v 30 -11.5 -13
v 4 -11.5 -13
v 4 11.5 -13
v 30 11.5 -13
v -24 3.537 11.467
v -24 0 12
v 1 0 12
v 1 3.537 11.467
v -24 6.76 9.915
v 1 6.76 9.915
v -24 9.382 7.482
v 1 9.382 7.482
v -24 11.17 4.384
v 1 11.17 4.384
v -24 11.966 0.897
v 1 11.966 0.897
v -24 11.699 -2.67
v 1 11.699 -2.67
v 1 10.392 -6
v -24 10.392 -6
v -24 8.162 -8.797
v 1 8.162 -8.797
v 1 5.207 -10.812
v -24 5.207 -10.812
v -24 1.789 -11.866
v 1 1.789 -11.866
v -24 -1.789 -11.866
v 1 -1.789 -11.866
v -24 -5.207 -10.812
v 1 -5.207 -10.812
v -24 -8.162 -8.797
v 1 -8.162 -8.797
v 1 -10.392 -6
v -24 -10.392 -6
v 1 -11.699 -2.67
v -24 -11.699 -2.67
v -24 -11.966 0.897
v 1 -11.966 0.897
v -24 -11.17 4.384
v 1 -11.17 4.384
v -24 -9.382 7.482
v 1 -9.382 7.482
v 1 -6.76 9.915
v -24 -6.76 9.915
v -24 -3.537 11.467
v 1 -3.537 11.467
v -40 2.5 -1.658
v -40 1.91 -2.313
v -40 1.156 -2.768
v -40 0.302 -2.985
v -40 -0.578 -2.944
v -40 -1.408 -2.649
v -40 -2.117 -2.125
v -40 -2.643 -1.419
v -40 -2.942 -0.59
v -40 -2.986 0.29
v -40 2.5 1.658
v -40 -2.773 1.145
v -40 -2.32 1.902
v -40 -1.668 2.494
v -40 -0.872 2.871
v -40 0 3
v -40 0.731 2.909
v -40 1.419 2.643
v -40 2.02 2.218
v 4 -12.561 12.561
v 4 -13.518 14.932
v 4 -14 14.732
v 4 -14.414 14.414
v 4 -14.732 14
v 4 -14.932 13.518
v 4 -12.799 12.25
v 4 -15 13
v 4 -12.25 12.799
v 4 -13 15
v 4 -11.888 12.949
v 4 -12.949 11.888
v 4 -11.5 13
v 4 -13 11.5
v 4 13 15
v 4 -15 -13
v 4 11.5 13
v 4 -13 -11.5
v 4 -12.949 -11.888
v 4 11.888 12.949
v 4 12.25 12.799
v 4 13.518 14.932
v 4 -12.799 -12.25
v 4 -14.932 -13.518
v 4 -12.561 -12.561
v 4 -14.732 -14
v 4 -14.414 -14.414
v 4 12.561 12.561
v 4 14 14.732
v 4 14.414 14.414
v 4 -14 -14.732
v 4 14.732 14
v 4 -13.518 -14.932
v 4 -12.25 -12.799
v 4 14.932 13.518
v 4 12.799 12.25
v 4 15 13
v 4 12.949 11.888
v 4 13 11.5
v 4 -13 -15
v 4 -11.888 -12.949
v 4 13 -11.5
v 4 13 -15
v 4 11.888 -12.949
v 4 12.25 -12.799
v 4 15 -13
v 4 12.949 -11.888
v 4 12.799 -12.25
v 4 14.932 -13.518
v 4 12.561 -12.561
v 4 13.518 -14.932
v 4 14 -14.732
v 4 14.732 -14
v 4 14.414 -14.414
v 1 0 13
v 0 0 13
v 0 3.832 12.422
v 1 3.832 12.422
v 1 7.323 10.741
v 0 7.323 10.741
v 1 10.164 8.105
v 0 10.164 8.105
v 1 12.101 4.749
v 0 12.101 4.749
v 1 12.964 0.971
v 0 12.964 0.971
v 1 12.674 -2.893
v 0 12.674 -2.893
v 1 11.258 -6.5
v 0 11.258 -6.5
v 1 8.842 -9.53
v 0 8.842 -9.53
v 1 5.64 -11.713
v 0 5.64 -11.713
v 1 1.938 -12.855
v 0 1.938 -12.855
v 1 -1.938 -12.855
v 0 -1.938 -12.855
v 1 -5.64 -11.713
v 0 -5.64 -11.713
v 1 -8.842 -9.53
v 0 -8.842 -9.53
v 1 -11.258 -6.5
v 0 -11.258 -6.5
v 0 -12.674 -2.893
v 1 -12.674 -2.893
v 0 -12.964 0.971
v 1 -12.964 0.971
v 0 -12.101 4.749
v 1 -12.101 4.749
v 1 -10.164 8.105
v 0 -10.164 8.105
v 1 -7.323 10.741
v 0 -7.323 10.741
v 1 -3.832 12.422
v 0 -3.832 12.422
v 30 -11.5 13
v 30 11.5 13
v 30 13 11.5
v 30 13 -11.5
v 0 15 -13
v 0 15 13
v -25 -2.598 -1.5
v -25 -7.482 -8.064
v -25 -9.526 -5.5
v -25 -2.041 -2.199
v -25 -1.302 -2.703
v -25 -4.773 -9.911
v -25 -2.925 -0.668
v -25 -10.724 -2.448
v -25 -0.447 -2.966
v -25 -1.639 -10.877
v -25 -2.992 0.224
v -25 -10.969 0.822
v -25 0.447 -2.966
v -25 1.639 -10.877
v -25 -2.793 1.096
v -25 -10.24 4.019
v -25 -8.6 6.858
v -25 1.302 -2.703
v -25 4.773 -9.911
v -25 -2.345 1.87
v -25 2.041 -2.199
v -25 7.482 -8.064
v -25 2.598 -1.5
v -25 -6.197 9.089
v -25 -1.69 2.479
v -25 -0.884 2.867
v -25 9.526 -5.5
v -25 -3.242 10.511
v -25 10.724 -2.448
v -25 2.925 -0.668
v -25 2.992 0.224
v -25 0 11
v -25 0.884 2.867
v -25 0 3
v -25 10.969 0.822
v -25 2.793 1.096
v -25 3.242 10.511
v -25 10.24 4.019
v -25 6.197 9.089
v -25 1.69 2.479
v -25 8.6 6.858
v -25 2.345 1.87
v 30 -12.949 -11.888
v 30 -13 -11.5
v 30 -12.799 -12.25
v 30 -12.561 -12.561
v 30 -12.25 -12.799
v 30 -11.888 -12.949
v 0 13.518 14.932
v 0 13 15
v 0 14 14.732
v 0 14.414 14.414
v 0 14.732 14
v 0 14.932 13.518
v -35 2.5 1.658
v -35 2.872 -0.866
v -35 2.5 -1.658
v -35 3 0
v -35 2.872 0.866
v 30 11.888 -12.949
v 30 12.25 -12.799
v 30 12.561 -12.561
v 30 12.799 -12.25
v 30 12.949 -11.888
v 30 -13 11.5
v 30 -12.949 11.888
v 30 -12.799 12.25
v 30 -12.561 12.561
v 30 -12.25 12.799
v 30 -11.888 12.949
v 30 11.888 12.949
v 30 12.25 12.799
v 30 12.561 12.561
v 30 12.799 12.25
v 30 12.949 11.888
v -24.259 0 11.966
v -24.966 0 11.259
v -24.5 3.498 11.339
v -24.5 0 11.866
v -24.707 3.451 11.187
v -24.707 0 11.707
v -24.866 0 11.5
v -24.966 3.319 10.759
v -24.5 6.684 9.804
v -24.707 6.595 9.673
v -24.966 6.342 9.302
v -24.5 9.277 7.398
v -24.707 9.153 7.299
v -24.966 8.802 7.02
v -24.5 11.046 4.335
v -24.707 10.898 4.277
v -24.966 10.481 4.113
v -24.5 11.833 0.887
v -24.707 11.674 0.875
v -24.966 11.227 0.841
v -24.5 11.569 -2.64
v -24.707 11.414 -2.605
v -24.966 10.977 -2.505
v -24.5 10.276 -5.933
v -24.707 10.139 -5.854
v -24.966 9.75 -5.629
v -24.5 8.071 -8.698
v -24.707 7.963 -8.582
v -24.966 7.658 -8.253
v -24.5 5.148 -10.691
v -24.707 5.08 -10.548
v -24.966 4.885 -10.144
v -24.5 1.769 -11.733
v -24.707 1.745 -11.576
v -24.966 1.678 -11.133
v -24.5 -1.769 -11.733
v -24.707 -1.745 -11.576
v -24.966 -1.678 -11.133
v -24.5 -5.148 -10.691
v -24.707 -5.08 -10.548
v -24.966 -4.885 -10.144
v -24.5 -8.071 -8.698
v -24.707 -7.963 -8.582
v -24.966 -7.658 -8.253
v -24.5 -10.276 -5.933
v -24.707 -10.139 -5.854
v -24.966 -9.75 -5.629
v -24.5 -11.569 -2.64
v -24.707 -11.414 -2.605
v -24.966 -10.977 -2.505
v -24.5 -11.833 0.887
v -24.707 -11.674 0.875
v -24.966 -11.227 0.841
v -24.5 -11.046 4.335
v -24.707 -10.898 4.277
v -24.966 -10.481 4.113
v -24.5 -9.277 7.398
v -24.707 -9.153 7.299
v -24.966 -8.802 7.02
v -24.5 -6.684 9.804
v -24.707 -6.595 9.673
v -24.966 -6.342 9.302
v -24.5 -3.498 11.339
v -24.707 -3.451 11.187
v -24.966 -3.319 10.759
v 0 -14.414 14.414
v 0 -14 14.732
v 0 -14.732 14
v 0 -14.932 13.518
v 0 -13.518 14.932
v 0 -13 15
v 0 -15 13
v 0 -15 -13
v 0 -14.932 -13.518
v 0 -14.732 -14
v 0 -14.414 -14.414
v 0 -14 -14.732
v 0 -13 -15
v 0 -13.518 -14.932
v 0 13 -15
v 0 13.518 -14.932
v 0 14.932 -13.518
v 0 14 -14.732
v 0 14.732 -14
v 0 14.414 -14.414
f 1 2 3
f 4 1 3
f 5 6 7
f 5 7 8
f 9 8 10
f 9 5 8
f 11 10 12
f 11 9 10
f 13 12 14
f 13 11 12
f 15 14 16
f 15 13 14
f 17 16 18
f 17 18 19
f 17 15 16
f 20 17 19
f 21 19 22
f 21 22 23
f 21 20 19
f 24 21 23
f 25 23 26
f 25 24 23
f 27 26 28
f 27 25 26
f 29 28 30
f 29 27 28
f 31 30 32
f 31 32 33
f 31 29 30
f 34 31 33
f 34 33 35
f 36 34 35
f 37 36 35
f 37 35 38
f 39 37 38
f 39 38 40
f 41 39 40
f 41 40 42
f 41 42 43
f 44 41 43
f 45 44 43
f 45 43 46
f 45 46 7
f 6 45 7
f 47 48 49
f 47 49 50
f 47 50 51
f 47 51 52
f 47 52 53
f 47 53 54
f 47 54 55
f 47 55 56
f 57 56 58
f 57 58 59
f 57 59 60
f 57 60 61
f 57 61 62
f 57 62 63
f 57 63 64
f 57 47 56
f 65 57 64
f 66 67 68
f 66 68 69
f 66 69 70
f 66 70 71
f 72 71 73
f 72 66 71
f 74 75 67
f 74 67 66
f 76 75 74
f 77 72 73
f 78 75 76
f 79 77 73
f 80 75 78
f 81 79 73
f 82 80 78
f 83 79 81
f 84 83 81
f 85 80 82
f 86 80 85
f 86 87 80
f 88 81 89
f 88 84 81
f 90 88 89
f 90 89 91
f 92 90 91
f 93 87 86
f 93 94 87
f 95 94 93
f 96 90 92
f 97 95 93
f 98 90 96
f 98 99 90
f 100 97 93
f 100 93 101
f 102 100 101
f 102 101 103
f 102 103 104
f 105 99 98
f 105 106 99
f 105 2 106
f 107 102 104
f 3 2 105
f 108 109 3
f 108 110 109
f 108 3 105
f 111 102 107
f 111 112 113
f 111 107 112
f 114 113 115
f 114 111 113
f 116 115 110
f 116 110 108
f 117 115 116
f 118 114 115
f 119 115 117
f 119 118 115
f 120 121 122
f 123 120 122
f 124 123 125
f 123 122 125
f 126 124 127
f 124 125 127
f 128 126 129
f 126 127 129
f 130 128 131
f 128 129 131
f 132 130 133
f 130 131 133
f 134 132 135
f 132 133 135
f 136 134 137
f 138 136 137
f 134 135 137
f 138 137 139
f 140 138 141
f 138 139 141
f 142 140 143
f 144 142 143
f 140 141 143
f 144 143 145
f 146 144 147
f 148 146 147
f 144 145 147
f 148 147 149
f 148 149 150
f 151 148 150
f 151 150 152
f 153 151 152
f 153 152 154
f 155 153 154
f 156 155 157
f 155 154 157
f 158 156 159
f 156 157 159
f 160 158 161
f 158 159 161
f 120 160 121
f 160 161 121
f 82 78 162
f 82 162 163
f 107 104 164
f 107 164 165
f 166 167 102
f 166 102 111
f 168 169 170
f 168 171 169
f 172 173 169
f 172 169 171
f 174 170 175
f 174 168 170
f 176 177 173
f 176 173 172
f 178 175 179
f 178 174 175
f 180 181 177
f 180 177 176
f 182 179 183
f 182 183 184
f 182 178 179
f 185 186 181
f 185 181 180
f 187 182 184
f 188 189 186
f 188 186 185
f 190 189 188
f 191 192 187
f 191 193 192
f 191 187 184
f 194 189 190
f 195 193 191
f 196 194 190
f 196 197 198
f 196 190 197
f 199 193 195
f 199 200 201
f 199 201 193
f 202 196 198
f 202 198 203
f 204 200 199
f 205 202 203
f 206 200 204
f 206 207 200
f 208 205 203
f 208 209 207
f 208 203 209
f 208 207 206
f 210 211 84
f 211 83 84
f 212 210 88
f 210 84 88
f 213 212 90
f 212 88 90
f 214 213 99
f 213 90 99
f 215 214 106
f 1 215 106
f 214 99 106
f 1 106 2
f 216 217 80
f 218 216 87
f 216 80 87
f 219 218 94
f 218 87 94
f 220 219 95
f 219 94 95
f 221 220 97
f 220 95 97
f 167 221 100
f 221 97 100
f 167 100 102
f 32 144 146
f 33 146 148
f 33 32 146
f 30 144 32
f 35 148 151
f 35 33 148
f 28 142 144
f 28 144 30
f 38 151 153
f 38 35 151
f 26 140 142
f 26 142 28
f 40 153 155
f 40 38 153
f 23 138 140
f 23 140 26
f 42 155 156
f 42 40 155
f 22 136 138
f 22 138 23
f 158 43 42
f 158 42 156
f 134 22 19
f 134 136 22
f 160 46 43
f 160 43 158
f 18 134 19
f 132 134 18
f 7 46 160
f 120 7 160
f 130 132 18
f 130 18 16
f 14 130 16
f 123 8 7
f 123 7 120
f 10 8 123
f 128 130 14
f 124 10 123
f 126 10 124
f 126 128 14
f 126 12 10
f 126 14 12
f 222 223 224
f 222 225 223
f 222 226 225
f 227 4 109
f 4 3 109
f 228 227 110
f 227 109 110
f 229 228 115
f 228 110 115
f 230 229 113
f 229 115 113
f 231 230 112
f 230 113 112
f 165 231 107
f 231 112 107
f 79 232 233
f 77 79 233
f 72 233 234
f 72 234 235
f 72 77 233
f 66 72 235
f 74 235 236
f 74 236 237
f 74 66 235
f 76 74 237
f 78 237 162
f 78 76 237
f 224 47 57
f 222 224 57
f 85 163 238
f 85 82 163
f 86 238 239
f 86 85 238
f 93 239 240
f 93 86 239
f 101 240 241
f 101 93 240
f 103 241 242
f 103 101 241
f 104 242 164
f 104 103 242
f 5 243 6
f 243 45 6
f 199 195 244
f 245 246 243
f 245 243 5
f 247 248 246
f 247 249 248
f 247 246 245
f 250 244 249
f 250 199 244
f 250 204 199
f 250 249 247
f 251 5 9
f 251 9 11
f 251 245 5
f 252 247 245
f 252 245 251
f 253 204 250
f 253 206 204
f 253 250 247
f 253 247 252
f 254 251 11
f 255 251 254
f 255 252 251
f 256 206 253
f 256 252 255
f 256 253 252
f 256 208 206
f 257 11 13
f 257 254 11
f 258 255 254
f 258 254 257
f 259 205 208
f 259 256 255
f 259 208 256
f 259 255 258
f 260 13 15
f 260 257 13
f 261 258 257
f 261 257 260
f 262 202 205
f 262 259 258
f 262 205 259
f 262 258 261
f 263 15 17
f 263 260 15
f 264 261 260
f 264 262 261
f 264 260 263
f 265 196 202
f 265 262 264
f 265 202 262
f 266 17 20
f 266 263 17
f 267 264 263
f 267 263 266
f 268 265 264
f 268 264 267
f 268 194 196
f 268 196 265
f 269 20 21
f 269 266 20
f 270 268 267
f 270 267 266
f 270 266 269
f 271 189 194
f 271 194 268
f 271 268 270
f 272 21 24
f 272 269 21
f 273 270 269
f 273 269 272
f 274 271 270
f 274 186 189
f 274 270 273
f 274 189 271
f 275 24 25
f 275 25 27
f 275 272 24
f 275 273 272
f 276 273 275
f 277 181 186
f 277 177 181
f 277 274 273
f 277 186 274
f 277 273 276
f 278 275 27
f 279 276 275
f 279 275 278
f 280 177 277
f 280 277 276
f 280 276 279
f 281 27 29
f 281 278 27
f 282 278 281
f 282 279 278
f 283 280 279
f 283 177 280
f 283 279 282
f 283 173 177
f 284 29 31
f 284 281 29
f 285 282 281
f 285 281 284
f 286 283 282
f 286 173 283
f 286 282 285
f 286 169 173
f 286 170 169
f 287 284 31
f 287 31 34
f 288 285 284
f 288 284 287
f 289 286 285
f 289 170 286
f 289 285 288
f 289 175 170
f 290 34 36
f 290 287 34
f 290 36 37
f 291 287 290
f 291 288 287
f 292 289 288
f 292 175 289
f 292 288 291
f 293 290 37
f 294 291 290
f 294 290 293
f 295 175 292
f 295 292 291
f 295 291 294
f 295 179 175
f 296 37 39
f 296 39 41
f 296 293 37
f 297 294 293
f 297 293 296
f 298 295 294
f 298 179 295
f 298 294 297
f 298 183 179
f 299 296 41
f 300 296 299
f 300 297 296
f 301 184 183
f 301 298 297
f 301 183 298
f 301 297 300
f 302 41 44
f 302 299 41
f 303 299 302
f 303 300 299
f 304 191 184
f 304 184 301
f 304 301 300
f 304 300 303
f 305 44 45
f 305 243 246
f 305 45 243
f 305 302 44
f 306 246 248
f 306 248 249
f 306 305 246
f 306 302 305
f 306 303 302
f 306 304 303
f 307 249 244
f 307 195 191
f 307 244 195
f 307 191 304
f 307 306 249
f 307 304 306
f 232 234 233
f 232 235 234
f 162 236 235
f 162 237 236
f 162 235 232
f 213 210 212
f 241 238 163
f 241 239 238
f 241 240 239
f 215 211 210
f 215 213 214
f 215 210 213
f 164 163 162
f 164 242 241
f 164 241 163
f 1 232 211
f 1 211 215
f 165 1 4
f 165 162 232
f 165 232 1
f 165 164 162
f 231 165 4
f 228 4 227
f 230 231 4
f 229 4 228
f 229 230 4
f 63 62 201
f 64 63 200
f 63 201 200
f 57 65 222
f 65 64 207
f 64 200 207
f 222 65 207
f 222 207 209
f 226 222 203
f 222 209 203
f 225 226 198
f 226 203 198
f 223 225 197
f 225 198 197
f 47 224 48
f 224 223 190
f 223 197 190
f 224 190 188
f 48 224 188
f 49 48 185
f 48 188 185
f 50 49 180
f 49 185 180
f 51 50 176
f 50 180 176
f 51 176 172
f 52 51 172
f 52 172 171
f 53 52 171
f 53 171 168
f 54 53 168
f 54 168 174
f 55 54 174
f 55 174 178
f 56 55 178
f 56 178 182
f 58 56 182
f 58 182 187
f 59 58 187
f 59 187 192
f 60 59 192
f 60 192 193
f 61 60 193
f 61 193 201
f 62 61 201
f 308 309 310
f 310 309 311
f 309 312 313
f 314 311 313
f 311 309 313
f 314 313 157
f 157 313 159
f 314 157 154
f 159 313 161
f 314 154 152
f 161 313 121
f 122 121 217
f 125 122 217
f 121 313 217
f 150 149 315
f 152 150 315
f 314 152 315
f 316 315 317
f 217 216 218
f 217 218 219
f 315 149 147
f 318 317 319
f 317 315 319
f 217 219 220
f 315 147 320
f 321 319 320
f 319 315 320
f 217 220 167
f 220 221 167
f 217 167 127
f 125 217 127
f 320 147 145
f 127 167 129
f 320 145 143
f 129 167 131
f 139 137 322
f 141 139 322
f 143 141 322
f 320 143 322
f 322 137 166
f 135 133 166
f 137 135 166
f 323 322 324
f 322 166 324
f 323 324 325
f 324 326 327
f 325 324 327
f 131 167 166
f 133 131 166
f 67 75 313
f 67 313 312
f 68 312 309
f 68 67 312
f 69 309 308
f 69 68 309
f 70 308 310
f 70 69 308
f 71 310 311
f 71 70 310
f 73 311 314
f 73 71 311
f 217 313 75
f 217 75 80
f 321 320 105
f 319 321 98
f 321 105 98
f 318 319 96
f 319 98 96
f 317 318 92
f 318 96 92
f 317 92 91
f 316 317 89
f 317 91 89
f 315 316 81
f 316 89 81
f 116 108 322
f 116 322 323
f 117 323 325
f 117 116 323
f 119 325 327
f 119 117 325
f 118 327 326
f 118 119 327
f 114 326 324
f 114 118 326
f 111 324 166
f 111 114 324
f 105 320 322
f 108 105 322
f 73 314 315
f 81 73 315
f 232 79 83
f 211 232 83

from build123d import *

# Parameters (mm, degrees)
SKETCH_1_W          = 30
SKETCH_1_H          = 30
EXTRUDE_1_DEPTH     = 30
SKETCH_2_R          = 12
EXTRUDE_2_DEPTH     = 25
SKETCH_3_R          = 13
SKETCH_3_R_2        = 12
CUT_EXTRUDE_1_DEPTH = 1
FILLET_1_R          = 2
FILLET_2_R          = 1
SKETCH_5_W          = 30
SKETCH_5_H          = 30
SKETCH_5_W_2        = 26
SKETCH_5_H_2        = 26
CUT_EXTRUDE_2_DEPTH = 26
FILLET_3_R          = 1.5
SKETCH_4_R          = 3
EXTRUDE_3_DEPTH     = 15
SKETCH_6_W          = 3.31662479
SKETCH_6_H          = 0.5
CUT_EXTRUDE_3_DEPTH = 5


with BuildPart() as part:
    # 草图1 → 凸台-拉伸1 (new body)
    with BuildSketch(Plane(origin=(0, 0, 0), x_dir=(0, 0, -1), z_dir=(1, 0, 0))):
        Rectangle(SKETCH_1_W, SKETCH_1_H)
    extrude(amount=EXTRUDE_1_DEPTH)

    # 草图2 → 凸台-拉伸2 (add)
    with BuildSketch(Plane.ZY):
        Circle(SKETCH_2_R)
    extrude(amount=EXTRUDE_2_DEPTH)

    # 草图3 → 切除-拉伸1 (cut)
    with BuildSketch(Plane.ZY):
        Circle(SKETCH_3_R)
        Circle(SKETCH_3_R_2, mode=Mode.SUBTRACT)
    extrude(amount=-CUT_EXTRUDE_1_DEPTH, mode=Mode.SUBTRACT)

    # 圆角1
    fillet_1_edges = [part.edges().sort_by_distance(p)[0] for p in [
        (15, 15, 15),
        (15, 15, -15),
        (15, -15, -15),
        (15, -15, 15),
    ]]
    fillet(fillet_1_edges, radius=FILLET_1_R)

    # 圆角2
    fillet_2_edges = [part.edges().sort_by_distance(p)[0] for p in [
        (-25, 0, -12),
    ]]
    fillet(fillet_2_edges, radius=FILLET_2_R)

    # 草图5 → 切除-拉伸2 (cut)
    with BuildSketch(Plane(origin=(30, 0, 0), x_dir=(0, 0, -1), z_dir=(1, 0, 0))):
        Rectangle(SKETCH_5_W, SKETCH_5_H)
        Rectangle(SKETCH_5_W_2, SKETCH_5_H_2, mode=Mode.SUBTRACT)
    extrude(amount=-CUT_EXTRUDE_2_DEPTH, mode=Mode.SUBTRACT)

    # 圆角3
    fillet_3_edges = [part.edges().sort_by_distance(p)[0] for p in [
        (17, 13, 13),
        (17, 13, -13),
        (17, -13, -13),
        (17, -13, 13),
    ]]
    fillet(fillet_3_edges, radius=FILLET_3_R)

    # 草图4 → 凸台-拉伸3 (add)
    with BuildSketch(Plane.ZY.offset(25)):
        Circle(SKETCH_4_R)
    extrude(amount=EXTRUDE_3_DEPTH)

    # 草图6 → 切除-拉伸3 (cut)
    with BuildSketch(Plane.ZY.offset(40)):
        with Locations((0, 2.75)):
            Rectangle(SKETCH_6_W, SKETCH_6_H)
    extrude(amount=-CUT_EXTRUDE_3_DEPTH, mode=Mode.SUBTRACT)


solid = part.part
